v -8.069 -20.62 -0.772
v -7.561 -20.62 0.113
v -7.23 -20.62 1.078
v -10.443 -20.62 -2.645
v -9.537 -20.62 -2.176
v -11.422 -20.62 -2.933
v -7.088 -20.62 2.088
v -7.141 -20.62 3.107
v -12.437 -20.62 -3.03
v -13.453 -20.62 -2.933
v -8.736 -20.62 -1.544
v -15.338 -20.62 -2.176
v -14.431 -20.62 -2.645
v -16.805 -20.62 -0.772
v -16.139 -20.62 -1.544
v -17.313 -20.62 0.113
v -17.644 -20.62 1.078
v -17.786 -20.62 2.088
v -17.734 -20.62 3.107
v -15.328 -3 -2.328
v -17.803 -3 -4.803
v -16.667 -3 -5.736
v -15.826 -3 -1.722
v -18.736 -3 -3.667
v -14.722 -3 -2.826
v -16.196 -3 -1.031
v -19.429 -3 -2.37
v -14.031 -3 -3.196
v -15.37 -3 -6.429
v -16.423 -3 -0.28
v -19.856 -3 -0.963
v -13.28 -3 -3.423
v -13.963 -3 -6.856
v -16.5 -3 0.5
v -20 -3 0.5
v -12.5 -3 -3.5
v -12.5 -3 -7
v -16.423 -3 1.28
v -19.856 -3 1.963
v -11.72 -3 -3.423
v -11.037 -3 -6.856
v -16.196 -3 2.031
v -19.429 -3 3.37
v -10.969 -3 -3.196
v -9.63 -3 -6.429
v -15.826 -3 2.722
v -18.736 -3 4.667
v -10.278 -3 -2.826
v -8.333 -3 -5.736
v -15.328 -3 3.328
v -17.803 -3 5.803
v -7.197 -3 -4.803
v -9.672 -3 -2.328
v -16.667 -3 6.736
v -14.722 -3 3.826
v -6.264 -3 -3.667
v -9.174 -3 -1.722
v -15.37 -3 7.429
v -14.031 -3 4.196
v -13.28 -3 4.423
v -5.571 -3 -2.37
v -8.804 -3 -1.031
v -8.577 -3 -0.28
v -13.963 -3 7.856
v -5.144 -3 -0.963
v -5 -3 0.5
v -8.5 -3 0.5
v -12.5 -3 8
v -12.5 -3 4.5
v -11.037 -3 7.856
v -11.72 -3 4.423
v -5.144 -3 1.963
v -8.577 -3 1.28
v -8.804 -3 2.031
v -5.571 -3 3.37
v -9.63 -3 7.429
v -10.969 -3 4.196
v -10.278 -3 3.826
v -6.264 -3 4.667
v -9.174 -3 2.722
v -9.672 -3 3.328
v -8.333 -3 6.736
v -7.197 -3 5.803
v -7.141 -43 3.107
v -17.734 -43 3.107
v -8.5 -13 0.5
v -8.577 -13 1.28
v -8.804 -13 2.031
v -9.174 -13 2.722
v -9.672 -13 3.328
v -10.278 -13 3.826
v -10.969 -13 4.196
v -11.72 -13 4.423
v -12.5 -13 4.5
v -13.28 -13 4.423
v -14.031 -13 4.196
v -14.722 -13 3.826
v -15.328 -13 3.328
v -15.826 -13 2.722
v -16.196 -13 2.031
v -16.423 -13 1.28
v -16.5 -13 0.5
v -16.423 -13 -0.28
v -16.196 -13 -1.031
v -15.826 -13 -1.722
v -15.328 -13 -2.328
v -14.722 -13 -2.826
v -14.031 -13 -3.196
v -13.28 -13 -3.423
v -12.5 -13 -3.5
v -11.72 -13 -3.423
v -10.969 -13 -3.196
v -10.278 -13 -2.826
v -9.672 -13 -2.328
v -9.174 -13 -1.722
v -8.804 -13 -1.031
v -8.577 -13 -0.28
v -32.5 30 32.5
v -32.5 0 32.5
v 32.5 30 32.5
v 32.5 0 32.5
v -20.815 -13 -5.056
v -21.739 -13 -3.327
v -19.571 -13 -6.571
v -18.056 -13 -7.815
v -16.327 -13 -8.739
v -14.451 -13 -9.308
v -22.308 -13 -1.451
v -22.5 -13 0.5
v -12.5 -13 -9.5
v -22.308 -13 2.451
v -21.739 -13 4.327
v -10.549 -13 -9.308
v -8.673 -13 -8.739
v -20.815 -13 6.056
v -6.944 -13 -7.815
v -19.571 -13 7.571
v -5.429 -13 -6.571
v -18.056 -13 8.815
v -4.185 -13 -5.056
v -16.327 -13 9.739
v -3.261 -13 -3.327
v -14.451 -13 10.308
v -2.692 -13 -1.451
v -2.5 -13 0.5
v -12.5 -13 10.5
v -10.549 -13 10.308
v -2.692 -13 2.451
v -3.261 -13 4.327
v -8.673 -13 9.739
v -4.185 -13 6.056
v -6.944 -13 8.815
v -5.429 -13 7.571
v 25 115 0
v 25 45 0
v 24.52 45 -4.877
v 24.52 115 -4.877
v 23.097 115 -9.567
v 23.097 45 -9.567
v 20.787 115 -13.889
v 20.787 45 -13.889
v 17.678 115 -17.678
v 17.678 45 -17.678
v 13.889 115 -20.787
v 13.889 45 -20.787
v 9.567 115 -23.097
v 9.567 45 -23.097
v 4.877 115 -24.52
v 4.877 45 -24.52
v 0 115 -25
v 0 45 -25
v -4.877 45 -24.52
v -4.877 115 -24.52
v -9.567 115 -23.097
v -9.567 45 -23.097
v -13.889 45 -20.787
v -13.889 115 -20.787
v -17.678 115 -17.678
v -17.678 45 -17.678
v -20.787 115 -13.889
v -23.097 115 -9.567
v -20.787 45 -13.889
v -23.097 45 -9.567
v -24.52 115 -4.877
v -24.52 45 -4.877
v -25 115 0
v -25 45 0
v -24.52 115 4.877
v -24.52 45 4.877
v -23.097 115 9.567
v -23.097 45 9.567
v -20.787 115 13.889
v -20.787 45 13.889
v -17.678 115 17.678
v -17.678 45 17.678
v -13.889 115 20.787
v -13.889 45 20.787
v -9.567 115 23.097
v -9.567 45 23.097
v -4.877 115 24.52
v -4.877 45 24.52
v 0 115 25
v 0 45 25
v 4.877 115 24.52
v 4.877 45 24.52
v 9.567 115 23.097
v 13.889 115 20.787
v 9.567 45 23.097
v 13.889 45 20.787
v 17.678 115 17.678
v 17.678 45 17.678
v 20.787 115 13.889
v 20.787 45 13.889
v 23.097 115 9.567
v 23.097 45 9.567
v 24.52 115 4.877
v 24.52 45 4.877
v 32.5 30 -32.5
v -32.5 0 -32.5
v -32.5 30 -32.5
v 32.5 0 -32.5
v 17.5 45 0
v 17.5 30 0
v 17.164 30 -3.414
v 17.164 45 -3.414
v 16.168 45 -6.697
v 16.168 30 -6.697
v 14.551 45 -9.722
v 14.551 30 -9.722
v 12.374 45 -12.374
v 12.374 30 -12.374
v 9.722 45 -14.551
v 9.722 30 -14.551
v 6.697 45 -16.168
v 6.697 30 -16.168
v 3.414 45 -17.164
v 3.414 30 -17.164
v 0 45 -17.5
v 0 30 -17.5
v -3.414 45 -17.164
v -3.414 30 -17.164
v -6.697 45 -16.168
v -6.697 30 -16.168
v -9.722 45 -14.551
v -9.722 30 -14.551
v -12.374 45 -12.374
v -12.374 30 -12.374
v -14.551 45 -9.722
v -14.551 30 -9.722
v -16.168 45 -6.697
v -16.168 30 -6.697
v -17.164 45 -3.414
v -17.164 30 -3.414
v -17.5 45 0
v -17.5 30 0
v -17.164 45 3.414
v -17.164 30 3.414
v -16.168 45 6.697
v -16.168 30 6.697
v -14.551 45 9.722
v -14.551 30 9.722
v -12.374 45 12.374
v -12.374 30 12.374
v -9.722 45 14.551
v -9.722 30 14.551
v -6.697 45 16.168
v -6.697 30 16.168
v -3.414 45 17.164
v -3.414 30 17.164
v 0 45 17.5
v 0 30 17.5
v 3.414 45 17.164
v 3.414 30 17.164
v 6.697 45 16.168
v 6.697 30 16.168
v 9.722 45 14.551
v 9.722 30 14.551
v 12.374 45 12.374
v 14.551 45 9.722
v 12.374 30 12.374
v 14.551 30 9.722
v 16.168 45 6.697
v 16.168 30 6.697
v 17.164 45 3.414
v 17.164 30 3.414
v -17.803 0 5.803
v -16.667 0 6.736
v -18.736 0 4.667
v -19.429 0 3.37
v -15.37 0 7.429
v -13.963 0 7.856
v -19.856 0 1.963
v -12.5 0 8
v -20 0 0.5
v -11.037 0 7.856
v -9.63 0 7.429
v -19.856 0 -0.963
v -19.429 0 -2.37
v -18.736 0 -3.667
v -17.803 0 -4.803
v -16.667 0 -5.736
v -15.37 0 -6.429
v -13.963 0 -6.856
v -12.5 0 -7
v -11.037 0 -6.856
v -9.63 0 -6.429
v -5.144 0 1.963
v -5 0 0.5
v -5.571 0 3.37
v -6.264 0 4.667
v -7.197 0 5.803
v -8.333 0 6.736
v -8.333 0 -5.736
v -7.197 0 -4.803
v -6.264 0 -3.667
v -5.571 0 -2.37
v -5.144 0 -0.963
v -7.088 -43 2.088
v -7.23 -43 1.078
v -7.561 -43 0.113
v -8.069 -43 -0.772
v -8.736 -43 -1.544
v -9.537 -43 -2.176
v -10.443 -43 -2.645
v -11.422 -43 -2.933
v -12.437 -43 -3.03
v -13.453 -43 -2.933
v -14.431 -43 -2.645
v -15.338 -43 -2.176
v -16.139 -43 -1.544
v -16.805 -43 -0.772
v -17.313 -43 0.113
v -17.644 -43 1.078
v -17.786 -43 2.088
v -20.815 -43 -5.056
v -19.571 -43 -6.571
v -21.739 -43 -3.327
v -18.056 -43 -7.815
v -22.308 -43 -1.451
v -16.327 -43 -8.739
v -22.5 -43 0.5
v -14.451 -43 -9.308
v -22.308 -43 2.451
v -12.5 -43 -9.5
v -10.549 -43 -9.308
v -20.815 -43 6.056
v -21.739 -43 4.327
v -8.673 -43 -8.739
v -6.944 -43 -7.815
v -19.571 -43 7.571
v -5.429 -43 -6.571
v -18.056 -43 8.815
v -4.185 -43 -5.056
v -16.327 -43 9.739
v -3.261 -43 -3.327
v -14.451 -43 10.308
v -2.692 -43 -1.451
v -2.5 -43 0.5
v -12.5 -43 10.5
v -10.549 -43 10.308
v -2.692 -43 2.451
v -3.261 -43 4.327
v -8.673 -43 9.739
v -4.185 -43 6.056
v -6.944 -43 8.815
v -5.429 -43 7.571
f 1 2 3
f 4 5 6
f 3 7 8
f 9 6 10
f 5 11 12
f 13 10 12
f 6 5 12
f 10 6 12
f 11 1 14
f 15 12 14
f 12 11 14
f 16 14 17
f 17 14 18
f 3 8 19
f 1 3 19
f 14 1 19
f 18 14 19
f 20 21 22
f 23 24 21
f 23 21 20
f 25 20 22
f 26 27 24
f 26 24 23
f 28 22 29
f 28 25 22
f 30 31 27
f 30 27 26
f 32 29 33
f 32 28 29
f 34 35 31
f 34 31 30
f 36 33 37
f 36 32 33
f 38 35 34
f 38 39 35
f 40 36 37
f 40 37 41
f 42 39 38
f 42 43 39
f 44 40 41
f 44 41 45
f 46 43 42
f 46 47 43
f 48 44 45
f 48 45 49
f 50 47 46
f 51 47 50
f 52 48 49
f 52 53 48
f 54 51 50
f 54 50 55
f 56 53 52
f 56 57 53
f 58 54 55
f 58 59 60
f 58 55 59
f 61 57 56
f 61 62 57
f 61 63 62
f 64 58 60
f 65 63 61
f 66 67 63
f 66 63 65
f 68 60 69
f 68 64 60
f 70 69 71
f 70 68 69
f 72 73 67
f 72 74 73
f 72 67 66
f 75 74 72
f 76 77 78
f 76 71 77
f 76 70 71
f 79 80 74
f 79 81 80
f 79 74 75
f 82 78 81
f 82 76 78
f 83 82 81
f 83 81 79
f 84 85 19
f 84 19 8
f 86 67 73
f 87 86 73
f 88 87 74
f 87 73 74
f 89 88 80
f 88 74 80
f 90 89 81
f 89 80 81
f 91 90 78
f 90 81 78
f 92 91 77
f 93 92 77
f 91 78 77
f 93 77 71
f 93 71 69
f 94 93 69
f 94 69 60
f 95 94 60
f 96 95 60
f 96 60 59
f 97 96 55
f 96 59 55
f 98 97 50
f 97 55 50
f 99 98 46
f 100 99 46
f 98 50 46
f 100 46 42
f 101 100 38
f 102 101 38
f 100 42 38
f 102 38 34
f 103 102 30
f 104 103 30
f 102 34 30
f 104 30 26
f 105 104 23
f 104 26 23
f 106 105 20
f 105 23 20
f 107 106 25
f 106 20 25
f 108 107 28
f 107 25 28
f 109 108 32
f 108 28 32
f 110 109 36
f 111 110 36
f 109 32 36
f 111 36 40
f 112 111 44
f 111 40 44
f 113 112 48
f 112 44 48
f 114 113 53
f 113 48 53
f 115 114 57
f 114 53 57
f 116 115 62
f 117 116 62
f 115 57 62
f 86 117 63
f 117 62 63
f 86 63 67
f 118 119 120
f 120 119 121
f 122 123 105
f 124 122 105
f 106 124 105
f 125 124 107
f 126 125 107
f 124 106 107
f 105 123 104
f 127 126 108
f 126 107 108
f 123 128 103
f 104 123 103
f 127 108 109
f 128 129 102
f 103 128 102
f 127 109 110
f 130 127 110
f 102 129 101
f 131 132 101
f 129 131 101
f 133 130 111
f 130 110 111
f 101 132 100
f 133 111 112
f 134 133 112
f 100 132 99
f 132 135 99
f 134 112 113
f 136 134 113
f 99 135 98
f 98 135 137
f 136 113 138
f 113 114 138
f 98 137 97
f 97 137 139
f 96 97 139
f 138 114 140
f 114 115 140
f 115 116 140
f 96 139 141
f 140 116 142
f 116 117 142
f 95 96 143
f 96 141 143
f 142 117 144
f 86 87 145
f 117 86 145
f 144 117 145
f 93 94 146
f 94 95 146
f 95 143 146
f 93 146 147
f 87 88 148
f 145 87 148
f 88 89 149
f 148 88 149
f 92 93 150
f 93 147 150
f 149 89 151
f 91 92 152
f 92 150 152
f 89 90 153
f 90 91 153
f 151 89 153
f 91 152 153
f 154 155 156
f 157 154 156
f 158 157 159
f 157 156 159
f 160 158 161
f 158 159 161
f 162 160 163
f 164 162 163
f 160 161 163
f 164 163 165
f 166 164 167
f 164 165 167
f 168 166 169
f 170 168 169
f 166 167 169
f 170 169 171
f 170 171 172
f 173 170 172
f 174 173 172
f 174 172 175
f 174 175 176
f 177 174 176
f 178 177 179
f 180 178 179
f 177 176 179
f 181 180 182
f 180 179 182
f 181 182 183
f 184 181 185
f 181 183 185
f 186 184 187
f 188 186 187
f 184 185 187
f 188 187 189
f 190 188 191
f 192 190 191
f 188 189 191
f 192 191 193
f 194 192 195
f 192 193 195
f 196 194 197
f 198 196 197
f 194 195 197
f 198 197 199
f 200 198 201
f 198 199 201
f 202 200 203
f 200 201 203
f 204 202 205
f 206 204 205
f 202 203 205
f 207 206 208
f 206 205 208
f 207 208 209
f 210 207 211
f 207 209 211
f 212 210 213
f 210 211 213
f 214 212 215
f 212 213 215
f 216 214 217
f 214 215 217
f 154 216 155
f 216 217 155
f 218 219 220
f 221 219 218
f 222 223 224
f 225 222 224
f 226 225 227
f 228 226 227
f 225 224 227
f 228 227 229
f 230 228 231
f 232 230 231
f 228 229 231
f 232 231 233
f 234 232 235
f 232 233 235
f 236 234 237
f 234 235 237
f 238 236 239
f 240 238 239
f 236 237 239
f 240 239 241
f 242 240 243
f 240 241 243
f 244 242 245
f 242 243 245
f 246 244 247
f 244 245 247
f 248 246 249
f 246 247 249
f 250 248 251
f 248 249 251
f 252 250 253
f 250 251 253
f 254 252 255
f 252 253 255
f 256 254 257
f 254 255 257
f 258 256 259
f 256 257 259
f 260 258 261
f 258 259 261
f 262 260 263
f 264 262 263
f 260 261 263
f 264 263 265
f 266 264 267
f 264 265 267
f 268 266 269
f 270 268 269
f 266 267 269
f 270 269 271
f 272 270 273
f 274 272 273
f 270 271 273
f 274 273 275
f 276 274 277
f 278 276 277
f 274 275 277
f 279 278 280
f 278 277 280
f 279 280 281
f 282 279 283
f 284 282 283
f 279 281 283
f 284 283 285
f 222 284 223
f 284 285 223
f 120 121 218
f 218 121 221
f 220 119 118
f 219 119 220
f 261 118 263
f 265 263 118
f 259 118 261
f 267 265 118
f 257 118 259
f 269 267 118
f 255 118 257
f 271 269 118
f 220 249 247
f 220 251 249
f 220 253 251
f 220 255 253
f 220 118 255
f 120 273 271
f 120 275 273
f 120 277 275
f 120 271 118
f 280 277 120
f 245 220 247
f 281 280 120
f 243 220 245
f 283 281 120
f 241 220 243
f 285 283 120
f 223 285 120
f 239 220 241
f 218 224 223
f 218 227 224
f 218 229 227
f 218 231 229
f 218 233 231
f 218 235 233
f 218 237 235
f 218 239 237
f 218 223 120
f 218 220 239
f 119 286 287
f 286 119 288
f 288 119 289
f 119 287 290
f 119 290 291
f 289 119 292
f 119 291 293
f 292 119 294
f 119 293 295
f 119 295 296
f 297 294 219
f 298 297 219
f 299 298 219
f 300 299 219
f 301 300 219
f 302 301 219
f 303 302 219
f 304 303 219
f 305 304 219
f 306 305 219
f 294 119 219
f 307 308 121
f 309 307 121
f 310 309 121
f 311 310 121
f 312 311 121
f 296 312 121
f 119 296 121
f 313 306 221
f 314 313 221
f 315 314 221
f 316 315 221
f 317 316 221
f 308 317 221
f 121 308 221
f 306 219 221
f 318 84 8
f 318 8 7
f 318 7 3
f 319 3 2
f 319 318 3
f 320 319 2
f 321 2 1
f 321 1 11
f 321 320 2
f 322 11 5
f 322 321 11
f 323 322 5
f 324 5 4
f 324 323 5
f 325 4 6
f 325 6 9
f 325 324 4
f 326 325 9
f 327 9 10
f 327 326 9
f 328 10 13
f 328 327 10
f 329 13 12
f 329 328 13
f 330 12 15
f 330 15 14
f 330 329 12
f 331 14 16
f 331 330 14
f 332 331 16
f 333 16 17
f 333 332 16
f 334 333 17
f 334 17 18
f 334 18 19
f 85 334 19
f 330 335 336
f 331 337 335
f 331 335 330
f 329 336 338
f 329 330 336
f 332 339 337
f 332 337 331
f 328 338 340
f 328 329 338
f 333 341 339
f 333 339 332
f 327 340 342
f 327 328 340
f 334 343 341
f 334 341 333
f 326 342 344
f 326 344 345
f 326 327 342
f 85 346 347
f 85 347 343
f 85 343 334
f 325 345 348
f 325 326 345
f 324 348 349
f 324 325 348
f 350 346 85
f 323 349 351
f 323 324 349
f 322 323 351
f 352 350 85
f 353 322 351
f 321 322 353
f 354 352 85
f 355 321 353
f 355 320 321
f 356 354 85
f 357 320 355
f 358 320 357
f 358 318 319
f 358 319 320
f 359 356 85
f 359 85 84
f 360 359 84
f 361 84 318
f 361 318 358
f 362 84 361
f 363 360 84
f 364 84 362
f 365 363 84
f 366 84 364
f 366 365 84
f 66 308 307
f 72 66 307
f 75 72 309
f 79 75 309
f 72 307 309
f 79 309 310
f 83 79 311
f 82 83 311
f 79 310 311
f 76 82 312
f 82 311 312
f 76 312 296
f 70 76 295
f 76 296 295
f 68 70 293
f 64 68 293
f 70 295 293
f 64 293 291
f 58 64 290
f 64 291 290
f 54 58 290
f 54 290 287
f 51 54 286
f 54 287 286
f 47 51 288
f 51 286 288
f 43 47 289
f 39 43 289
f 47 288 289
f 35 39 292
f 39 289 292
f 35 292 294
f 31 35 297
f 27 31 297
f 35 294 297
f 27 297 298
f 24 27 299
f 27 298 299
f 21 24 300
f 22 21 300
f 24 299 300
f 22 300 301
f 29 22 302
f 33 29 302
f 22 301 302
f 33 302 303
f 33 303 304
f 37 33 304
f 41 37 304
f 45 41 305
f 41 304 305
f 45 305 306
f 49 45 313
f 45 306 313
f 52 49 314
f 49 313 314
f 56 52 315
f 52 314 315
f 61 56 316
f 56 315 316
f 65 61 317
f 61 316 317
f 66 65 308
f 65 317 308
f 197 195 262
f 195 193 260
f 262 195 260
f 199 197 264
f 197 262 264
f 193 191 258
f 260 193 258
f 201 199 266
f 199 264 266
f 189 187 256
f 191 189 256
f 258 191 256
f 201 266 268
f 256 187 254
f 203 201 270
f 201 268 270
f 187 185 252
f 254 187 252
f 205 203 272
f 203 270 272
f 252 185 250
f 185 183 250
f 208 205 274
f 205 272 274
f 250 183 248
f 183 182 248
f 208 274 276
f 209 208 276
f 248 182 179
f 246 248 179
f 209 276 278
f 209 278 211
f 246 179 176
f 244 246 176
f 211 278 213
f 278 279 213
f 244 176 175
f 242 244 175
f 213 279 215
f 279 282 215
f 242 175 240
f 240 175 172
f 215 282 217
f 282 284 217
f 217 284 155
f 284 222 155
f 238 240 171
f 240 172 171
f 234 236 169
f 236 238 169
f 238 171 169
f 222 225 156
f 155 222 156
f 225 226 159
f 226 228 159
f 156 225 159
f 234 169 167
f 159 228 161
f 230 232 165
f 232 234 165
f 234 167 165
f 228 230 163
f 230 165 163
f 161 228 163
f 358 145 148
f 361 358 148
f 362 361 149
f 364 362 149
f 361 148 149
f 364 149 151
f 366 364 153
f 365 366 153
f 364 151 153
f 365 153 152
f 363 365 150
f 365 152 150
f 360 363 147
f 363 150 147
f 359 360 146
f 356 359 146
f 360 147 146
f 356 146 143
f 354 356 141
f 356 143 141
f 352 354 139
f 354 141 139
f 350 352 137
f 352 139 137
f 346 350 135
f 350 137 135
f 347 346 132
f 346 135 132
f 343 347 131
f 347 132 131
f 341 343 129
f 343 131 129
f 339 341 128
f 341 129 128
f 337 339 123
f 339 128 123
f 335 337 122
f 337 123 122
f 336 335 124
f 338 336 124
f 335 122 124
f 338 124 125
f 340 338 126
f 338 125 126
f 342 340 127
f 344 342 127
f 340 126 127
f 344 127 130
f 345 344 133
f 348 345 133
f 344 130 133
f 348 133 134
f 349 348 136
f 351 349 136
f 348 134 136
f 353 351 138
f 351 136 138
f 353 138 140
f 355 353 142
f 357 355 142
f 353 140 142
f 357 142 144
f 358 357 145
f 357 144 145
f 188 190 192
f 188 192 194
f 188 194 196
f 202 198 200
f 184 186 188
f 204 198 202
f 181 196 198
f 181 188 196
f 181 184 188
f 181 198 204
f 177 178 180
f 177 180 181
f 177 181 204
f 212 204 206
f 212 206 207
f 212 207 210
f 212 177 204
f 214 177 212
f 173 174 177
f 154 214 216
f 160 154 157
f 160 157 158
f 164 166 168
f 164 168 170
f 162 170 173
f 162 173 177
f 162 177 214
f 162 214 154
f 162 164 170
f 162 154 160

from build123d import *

# Parameters (mm, degrees)
SKETCH1_W           = 65
SKETCH1_H           = 65
BOSS_EXTRUDE1_DEPTH = 30
SKETCH3_R           = 17.5
BOSS_EXTRUDE2_DEPTH = 15
SKETCH4_R           = 25
BOSS_EXTRUDE3_DEPTH = 70
SKETCH5_R           = 7.5
BOSS_EXTRUDE4_DEPTH = 3
SKETCH6_R           = 4
BOSS_EXTRUDE5_DEPTH = 10
SKETCH7_R           = 10
BOSS_EXTRUDE6_DEPTH = 30
CUT_EXTRUDE1_DEPTH  = 22.38


with BuildPart() as part:
    # Sketch1 → Boss-Extrude1 (new body)
    with BuildSketch(Plane(origin=(0, 0, 0), x_dir=(1, 0, 0), z_dir=(0, 1, 0))):
        Rectangle(SKETCH1_W, SKETCH1_H)
    extrude(amount=BOSS_EXTRUDE1_DEPTH)

    # Sketch3 → Boss-Extrude2 (add)
    with BuildSketch(Plane(origin=(0, 30, 0), x_dir=(1, 0, 0), z_dir=(0, 1, 0))):
        Circle(SKETCH3_R)
    extrude(amount=BOSS_EXTRUDE2_DEPTH)

    # Sketch4 → Boss-Extrude3 (add)
    with BuildSketch(Plane(origin=(0, 45, 0), x_dir=(1, 0, 0), z_dir=(0, 1, 0))):
        Circle(SKETCH4_R)
    extrude(amount=BOSS_EXTRUDE3_DEPTH)

    # Sketch5 → Boss-Extrude4 (add)
    with BuildSketch(Plane.XZ):
        with Locations((-12.500000122, 0.50000004)):
            Circle(SKETCH5_R)
    extrude(amount=BOSS_EXTRUDE4_DEPTH)

    # Sketch6 → Boss-Extrude5 (add)
    with BuildSketch(Plane.XZ.offset(3)):
        with Locations((-12.500000122, 0.50000004)):
            Circle(SKETCH6_R)
    extrude(amount=BOSS_EXTRUDE5_DEPTH)

    # Sketch7 → Boss-Extrude6 (add)
    with BuildSketch(Plane.XZ.offset(13)):
        with Locations((-12.500000122, 0.50000004)):
            Circle(SKETCH7_R)
    extrude(amount=BOSS_EXTRUDE6_DEPTH)

    # Sketch8 → Cut-Extrude1 (cut)
    with BuildSketch(Plane.XZ.offset(43)):
        with BuildLine():
            Line((-17.733861002, 3.106945343), (-7.140648736, 3.106945343))
            ThreePointArc((-7.140648736, 3.106945343), (-12.437254869, -3.029833946), (-17.733861002, 3.106945343))
        make_face()
    extrude(amount=-CUT_EXTRUDE1_DEPTH, mode=Mode.SUBTRACT)


solid = part.part
